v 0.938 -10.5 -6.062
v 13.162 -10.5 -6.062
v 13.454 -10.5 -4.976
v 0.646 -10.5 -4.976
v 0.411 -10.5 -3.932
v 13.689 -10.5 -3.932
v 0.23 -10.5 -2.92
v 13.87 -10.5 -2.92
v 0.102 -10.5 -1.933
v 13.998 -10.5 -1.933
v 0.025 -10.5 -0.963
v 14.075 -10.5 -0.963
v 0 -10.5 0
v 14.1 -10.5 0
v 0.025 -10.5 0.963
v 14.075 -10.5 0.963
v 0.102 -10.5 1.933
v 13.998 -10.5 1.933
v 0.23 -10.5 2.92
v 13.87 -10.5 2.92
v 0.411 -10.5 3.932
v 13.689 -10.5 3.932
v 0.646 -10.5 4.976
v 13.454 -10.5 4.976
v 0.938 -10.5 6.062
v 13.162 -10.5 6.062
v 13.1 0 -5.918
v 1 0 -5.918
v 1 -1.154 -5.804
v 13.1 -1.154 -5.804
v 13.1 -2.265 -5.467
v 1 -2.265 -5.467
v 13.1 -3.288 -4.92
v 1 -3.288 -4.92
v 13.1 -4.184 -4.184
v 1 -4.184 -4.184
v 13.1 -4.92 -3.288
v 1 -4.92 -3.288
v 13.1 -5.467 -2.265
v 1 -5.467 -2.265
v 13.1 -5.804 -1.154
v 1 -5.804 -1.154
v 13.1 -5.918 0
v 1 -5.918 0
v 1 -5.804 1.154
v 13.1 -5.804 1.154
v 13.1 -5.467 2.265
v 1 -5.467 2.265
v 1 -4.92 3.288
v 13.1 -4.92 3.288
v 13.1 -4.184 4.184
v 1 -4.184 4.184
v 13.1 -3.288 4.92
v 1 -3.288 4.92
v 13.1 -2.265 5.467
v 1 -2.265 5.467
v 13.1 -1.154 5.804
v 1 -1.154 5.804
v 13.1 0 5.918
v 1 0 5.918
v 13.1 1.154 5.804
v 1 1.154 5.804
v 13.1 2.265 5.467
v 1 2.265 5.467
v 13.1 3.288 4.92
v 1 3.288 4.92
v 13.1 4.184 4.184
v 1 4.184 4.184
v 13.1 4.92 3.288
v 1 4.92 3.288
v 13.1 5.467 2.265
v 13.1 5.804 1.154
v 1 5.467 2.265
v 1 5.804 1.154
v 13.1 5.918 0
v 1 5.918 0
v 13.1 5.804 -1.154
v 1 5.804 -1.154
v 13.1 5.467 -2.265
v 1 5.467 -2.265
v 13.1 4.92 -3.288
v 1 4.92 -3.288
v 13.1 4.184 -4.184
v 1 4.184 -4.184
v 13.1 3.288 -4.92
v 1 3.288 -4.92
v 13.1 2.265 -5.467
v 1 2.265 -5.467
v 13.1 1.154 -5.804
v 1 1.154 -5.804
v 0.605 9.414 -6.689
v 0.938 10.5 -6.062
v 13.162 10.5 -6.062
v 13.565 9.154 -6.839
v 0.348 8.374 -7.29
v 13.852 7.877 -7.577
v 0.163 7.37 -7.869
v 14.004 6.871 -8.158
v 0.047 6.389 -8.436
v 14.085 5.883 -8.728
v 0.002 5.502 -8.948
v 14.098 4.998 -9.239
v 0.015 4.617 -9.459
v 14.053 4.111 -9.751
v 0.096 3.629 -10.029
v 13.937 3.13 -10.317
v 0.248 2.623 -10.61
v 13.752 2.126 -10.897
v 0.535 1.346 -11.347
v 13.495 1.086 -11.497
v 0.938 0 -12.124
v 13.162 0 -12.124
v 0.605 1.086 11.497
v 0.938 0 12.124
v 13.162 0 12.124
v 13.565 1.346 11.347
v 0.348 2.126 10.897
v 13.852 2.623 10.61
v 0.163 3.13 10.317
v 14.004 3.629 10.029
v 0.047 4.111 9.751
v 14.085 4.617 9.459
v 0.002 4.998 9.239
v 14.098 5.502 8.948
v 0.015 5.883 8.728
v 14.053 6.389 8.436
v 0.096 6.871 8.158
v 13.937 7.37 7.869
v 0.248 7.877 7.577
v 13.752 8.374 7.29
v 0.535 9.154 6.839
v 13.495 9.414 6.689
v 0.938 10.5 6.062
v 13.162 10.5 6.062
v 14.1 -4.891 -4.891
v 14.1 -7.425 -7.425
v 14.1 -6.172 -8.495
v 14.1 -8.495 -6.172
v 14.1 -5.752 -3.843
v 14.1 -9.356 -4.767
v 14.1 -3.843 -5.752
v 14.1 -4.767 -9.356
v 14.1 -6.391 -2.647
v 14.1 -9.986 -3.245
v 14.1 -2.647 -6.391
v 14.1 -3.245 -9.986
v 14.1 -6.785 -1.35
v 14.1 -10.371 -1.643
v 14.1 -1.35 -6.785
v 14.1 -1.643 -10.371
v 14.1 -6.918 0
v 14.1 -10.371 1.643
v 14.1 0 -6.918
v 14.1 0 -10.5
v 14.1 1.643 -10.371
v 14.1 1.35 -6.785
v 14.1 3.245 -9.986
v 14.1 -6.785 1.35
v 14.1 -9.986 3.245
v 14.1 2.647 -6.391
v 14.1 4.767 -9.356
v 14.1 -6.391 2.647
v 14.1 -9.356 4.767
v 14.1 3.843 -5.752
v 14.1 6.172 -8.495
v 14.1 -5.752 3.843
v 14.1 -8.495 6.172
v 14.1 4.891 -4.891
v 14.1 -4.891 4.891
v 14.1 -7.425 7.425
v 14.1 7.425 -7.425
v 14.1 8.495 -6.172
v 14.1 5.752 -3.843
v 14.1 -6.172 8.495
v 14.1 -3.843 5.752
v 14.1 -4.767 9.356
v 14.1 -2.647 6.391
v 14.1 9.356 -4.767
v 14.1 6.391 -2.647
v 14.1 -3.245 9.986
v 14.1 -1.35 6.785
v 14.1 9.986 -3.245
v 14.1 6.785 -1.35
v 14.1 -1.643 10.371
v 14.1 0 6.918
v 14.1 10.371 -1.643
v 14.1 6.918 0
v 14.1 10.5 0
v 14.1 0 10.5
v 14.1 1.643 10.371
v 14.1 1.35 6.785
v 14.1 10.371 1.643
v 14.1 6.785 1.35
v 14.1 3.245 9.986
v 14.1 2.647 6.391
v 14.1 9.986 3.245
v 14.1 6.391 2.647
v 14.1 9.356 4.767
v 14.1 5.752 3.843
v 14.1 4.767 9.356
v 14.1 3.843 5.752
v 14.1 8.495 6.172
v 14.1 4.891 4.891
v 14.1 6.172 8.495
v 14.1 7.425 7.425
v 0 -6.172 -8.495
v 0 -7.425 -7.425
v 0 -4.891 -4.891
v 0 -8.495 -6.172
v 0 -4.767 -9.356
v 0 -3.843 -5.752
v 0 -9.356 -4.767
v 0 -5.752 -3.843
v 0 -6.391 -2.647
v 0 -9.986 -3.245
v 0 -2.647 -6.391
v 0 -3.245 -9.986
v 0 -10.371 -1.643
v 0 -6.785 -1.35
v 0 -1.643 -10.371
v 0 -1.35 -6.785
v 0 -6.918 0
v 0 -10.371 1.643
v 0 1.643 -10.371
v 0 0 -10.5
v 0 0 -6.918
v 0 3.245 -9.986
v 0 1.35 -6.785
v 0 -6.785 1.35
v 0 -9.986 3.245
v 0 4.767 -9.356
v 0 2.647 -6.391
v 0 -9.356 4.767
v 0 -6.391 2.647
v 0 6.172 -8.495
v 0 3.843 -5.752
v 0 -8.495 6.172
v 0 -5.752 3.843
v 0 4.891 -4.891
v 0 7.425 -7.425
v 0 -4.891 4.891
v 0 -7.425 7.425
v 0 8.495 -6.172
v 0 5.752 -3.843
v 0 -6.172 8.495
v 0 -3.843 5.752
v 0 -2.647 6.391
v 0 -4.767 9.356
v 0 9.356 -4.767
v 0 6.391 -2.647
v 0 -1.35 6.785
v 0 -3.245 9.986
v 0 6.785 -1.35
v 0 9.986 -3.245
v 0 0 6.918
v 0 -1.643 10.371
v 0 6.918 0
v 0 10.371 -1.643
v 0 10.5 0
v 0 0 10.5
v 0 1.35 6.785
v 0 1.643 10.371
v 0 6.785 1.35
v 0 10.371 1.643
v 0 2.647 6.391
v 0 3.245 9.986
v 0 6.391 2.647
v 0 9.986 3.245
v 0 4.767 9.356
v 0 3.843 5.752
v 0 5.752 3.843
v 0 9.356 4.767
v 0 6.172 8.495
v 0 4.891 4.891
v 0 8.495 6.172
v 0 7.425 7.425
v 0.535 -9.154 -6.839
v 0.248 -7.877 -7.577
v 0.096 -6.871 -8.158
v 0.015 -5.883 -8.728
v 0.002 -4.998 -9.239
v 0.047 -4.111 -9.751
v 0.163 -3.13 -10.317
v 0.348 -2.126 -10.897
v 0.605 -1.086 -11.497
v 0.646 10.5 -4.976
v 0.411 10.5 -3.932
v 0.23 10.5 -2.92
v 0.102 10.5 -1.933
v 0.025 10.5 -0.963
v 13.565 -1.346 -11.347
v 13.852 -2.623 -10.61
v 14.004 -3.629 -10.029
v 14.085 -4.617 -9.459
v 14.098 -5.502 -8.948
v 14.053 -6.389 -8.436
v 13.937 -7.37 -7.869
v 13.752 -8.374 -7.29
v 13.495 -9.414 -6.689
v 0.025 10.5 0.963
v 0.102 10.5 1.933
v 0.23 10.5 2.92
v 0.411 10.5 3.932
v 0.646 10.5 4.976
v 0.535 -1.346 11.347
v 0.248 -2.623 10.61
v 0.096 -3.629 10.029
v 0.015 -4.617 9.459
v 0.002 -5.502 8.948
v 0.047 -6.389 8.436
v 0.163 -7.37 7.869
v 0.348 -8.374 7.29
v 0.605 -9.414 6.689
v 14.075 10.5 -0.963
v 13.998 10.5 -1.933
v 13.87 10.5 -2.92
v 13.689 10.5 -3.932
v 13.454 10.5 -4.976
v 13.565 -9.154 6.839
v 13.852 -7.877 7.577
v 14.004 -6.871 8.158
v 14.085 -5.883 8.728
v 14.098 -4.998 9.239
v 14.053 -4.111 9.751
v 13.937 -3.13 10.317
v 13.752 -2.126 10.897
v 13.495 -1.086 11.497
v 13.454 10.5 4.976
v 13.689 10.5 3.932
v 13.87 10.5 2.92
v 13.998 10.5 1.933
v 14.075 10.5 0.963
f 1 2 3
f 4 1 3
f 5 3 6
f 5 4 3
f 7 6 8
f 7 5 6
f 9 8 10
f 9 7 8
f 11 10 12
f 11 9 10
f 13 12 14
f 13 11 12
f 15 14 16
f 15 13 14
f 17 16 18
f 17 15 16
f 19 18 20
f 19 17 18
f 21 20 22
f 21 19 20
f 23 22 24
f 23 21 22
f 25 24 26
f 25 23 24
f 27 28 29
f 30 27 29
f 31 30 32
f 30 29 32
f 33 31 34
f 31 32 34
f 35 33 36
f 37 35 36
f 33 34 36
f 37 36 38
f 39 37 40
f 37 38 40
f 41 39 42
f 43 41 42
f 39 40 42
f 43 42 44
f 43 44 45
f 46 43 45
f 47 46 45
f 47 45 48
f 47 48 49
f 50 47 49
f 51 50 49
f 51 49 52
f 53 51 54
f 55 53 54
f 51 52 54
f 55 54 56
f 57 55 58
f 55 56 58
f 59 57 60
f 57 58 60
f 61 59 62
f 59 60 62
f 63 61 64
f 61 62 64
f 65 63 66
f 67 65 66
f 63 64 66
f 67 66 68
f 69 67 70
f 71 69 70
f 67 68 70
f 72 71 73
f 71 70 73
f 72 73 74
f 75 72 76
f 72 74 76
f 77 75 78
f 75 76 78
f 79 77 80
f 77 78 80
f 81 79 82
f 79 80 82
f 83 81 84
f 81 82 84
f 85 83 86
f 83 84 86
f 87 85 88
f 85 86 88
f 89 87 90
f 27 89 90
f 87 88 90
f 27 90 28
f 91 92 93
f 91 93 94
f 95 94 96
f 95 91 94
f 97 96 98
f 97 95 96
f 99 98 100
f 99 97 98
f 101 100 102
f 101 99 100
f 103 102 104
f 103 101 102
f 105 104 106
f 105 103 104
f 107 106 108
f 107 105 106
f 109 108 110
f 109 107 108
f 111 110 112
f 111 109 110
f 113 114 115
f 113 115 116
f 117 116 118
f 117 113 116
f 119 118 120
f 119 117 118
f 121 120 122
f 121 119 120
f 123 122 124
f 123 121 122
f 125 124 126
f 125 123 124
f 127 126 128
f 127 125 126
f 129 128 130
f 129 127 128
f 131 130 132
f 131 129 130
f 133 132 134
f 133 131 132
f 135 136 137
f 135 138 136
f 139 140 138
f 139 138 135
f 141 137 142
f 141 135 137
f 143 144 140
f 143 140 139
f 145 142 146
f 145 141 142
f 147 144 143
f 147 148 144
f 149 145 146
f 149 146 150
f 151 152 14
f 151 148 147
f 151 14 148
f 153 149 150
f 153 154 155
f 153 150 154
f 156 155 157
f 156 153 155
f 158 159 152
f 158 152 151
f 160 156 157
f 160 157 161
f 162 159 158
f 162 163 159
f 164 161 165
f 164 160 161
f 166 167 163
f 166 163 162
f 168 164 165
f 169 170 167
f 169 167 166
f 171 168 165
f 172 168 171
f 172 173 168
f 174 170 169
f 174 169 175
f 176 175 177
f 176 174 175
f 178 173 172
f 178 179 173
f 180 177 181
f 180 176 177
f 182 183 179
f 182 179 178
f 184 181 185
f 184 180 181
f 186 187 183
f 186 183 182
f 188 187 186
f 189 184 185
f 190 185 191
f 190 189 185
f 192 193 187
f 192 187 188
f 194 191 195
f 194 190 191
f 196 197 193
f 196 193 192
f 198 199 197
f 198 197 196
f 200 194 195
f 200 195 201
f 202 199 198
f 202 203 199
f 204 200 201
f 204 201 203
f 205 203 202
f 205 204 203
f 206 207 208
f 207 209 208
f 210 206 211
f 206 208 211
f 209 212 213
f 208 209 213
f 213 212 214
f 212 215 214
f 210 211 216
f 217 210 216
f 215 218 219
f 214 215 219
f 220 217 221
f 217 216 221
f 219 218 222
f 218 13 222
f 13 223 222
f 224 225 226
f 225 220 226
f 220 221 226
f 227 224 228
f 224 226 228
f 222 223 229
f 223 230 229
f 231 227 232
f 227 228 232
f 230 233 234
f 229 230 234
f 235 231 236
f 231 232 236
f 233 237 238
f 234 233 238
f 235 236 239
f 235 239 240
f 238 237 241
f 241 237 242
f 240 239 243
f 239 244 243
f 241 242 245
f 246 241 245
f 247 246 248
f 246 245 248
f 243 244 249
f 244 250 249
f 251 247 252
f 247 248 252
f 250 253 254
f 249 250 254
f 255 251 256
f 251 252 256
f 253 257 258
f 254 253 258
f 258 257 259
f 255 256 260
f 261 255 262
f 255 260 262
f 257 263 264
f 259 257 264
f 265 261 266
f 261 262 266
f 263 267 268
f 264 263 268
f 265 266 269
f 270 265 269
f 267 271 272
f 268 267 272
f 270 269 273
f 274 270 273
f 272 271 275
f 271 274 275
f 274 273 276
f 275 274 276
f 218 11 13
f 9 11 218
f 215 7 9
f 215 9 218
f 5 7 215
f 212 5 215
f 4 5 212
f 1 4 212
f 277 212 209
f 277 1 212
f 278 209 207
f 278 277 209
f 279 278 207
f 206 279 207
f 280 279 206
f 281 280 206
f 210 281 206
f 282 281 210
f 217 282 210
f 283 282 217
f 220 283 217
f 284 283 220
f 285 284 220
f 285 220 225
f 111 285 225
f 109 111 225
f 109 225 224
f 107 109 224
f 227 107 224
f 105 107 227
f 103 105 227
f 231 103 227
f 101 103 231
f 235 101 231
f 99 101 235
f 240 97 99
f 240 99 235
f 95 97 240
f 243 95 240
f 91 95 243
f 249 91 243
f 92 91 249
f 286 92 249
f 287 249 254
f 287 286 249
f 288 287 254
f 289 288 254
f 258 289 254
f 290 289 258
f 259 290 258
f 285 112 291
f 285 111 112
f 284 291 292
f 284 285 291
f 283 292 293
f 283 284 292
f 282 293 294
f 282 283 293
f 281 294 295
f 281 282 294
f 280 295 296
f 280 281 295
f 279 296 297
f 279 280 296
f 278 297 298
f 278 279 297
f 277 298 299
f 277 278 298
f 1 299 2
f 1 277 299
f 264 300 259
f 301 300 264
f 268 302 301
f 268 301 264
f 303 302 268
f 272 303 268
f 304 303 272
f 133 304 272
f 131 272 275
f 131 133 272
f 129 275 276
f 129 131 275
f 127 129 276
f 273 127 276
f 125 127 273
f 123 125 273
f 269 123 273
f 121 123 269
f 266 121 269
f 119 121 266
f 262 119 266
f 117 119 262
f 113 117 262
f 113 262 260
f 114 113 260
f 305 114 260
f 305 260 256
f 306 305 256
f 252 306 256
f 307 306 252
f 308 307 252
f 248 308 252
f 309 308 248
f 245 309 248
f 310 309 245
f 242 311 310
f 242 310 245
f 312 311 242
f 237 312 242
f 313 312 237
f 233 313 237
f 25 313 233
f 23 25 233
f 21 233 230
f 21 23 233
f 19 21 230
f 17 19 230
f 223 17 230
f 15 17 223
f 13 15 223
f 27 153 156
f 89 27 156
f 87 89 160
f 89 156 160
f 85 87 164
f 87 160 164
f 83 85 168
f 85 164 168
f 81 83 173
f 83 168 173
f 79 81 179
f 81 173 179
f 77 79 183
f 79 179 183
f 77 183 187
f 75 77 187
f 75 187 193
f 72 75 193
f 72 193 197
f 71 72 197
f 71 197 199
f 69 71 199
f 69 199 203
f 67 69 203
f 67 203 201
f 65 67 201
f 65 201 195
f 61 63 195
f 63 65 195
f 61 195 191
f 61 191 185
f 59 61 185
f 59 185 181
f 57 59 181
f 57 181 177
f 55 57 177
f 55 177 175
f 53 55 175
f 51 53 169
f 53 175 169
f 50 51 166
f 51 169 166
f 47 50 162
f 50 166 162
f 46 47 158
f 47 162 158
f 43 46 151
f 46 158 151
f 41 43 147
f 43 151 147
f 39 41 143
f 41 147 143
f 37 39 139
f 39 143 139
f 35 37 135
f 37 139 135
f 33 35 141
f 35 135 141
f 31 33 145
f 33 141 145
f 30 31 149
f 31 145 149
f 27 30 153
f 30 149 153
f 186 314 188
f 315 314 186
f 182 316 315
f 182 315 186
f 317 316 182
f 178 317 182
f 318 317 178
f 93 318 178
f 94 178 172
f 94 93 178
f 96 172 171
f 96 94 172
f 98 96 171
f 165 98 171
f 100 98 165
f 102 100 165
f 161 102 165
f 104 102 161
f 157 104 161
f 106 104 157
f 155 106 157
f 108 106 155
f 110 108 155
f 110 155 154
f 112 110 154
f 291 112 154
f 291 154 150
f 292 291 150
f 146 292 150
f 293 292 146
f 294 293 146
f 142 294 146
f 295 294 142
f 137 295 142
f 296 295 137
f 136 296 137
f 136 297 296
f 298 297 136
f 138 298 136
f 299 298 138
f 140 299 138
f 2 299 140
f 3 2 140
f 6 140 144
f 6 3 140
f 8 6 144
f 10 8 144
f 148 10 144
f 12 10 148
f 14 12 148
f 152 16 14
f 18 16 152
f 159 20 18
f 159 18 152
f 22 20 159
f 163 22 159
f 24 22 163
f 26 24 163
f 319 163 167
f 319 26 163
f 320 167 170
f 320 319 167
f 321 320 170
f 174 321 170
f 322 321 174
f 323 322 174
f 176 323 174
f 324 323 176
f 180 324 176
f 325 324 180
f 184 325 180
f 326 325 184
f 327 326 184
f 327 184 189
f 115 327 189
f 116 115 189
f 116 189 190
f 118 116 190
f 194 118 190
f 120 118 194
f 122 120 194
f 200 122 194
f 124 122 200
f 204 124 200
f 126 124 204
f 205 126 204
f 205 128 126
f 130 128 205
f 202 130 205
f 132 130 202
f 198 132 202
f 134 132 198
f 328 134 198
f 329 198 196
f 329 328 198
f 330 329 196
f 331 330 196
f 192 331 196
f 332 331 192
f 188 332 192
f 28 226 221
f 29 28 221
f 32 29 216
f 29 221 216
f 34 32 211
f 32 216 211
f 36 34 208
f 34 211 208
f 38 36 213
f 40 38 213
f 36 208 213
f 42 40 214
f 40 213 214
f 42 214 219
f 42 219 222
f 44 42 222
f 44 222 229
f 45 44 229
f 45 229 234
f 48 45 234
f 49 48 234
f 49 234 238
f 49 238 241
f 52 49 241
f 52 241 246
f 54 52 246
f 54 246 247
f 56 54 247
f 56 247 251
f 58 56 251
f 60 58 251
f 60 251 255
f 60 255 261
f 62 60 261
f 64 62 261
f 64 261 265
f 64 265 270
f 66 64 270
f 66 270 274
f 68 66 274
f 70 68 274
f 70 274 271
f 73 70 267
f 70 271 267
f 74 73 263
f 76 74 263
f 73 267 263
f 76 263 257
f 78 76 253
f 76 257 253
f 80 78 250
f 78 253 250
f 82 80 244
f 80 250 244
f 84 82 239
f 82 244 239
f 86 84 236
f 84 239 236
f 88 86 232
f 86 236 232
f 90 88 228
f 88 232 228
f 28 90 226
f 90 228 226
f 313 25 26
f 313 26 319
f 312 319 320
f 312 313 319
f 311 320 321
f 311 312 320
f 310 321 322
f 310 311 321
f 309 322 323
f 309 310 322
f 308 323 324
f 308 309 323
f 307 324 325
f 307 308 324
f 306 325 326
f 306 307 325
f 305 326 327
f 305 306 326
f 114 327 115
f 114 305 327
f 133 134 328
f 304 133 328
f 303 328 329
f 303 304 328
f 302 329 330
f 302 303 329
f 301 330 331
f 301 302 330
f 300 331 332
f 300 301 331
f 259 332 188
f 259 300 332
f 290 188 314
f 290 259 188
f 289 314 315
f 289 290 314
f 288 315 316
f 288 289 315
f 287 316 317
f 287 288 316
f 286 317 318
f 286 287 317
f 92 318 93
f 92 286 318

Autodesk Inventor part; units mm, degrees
sketch "Sketch1" plane through (0, 0, 0) normal (1, 0, 0) x (0, 1, 0)
  line L0 (10.5, 6.0622) -> (10.5, -6.0622)
  line L1 (10.5, -6.0622) -> (0, -12.1244)
  line L2 (0, -12.1244) -> (-10.5, -6.0622)
  line L3 (-10.5, -6.0622) -> (-10.5, 6.0622)
  line L4 (-10.5, 6.0622) -> (0, 12.1244)
  line L5 (0, 12.1244) -> (10.5, 6.0622)
  circle A0 centre (0, 0) radius 10.5 construction
  dimension "d0" = 21
extrude "Extrusion1" add sketch "Sketch1" along normal blind 14.1
sketch "Sketch2" plane through (14.1, 0, 0) normal (1, 0, 0) x (0, 1, 0)
  line L0 (-10.5, 6.0622) -> (0, 12.1244) projected
  line L1 (0, -12.1244) -> (-10.5, -6.0622) projected
  line L2 (-10.5, 6.0622) -> (10.5, -6.0622) construction
  line L3 (-10.5, -6.0622) -> (10.5, 6.0622) construction
  point P0 (0, 0)
hole "Hole1" at (14.1, 0, 0) direction (-1, 0, 0) diameter 11.835 end through all thread size "M14x2" class "6H" standard "ISO Metric profile"
chamfer "Chamfer1" distance 1 angle 45 2 edges at (14.1, 0, 5.9175) (0, 0, 5.9175)
sketch "Sketch3" plane through (0, 0, 0) normal (0, 1, 0) x (-1, 0, 0)
  line L0 (-17.0915, 0) -> (3.8489, 0) projected
  line L1 (-5.7048, 0) -> (0.8574, 0)
  line L2 (-14.1, 0) -> (-14.1, -12.1244)
  line L3 (-14.1, -12.1244) -> (0, -12.1244)
  line L4 (0, -12.1244) -> (0, 0)
  line L5 (-14.1, -6.0622) -> (-14.1, -12.1244) projected
  line L6 (0, -6.0622) -> (0, -12.1244) projected
  line L7 (0, -12.1244) -> (-14.1, -12.1244) projected
  line L8 (-14.1, -10.5) -> (-13.1622, -12.1244)
  line L9 (-14.1, -12.1244) -> (-14.1, -10.5)
  line L10 (-14.1, -12.1244) -> (-13.1622, -12.1244)
  line L11 (0, -10.5) -> (-0.9378, -12.1244)
  line L12 (-0.9378, -12.1244) -> (0, -12.1244)
  line L13 (0, -12.1244) -> (0, -10.5)
  dimension "d32" = 10.5
  dimension "d33" = 30
revolve "Revolution1" cut sketch "Sketch3" angle 360 about axis through (0, 0, 0) along (-1, 0, 0) contours L8 L3 L2 | L4 L3 L11
ref_plane "MSC_PT1" through (14.1, 0, 0) normal (1, 0, 0) x (0, 1, 0)
ref_plane "MSC_PT2" through (0, 0, 0) normal (-1, 0, 0) x (0, -1, 0)
ref_plane "MSC_PF1" through (0, 0, 0) normal (1, 0, 0) x (0, 1, 0)
equation "\"d0\" = Smax"
equation "\"d1\" = Mmax"
equation "\"d10\" = 0.5 * PTC"
equation "\"d32\" = 0.5 * Smax"
equation "\"NND\" = 14"
equation "\"Smax\" = 21"
equation "\"Mmax\" = 14.1"
equation "\"PTC\" = 2"
equation "\"THREADDIA\" = NND"
equation "\"TEMPLATE\" = 1.2345"
properties part number "ANSI B18.2.4.2M - M14x2" material "Steel, Mild"
